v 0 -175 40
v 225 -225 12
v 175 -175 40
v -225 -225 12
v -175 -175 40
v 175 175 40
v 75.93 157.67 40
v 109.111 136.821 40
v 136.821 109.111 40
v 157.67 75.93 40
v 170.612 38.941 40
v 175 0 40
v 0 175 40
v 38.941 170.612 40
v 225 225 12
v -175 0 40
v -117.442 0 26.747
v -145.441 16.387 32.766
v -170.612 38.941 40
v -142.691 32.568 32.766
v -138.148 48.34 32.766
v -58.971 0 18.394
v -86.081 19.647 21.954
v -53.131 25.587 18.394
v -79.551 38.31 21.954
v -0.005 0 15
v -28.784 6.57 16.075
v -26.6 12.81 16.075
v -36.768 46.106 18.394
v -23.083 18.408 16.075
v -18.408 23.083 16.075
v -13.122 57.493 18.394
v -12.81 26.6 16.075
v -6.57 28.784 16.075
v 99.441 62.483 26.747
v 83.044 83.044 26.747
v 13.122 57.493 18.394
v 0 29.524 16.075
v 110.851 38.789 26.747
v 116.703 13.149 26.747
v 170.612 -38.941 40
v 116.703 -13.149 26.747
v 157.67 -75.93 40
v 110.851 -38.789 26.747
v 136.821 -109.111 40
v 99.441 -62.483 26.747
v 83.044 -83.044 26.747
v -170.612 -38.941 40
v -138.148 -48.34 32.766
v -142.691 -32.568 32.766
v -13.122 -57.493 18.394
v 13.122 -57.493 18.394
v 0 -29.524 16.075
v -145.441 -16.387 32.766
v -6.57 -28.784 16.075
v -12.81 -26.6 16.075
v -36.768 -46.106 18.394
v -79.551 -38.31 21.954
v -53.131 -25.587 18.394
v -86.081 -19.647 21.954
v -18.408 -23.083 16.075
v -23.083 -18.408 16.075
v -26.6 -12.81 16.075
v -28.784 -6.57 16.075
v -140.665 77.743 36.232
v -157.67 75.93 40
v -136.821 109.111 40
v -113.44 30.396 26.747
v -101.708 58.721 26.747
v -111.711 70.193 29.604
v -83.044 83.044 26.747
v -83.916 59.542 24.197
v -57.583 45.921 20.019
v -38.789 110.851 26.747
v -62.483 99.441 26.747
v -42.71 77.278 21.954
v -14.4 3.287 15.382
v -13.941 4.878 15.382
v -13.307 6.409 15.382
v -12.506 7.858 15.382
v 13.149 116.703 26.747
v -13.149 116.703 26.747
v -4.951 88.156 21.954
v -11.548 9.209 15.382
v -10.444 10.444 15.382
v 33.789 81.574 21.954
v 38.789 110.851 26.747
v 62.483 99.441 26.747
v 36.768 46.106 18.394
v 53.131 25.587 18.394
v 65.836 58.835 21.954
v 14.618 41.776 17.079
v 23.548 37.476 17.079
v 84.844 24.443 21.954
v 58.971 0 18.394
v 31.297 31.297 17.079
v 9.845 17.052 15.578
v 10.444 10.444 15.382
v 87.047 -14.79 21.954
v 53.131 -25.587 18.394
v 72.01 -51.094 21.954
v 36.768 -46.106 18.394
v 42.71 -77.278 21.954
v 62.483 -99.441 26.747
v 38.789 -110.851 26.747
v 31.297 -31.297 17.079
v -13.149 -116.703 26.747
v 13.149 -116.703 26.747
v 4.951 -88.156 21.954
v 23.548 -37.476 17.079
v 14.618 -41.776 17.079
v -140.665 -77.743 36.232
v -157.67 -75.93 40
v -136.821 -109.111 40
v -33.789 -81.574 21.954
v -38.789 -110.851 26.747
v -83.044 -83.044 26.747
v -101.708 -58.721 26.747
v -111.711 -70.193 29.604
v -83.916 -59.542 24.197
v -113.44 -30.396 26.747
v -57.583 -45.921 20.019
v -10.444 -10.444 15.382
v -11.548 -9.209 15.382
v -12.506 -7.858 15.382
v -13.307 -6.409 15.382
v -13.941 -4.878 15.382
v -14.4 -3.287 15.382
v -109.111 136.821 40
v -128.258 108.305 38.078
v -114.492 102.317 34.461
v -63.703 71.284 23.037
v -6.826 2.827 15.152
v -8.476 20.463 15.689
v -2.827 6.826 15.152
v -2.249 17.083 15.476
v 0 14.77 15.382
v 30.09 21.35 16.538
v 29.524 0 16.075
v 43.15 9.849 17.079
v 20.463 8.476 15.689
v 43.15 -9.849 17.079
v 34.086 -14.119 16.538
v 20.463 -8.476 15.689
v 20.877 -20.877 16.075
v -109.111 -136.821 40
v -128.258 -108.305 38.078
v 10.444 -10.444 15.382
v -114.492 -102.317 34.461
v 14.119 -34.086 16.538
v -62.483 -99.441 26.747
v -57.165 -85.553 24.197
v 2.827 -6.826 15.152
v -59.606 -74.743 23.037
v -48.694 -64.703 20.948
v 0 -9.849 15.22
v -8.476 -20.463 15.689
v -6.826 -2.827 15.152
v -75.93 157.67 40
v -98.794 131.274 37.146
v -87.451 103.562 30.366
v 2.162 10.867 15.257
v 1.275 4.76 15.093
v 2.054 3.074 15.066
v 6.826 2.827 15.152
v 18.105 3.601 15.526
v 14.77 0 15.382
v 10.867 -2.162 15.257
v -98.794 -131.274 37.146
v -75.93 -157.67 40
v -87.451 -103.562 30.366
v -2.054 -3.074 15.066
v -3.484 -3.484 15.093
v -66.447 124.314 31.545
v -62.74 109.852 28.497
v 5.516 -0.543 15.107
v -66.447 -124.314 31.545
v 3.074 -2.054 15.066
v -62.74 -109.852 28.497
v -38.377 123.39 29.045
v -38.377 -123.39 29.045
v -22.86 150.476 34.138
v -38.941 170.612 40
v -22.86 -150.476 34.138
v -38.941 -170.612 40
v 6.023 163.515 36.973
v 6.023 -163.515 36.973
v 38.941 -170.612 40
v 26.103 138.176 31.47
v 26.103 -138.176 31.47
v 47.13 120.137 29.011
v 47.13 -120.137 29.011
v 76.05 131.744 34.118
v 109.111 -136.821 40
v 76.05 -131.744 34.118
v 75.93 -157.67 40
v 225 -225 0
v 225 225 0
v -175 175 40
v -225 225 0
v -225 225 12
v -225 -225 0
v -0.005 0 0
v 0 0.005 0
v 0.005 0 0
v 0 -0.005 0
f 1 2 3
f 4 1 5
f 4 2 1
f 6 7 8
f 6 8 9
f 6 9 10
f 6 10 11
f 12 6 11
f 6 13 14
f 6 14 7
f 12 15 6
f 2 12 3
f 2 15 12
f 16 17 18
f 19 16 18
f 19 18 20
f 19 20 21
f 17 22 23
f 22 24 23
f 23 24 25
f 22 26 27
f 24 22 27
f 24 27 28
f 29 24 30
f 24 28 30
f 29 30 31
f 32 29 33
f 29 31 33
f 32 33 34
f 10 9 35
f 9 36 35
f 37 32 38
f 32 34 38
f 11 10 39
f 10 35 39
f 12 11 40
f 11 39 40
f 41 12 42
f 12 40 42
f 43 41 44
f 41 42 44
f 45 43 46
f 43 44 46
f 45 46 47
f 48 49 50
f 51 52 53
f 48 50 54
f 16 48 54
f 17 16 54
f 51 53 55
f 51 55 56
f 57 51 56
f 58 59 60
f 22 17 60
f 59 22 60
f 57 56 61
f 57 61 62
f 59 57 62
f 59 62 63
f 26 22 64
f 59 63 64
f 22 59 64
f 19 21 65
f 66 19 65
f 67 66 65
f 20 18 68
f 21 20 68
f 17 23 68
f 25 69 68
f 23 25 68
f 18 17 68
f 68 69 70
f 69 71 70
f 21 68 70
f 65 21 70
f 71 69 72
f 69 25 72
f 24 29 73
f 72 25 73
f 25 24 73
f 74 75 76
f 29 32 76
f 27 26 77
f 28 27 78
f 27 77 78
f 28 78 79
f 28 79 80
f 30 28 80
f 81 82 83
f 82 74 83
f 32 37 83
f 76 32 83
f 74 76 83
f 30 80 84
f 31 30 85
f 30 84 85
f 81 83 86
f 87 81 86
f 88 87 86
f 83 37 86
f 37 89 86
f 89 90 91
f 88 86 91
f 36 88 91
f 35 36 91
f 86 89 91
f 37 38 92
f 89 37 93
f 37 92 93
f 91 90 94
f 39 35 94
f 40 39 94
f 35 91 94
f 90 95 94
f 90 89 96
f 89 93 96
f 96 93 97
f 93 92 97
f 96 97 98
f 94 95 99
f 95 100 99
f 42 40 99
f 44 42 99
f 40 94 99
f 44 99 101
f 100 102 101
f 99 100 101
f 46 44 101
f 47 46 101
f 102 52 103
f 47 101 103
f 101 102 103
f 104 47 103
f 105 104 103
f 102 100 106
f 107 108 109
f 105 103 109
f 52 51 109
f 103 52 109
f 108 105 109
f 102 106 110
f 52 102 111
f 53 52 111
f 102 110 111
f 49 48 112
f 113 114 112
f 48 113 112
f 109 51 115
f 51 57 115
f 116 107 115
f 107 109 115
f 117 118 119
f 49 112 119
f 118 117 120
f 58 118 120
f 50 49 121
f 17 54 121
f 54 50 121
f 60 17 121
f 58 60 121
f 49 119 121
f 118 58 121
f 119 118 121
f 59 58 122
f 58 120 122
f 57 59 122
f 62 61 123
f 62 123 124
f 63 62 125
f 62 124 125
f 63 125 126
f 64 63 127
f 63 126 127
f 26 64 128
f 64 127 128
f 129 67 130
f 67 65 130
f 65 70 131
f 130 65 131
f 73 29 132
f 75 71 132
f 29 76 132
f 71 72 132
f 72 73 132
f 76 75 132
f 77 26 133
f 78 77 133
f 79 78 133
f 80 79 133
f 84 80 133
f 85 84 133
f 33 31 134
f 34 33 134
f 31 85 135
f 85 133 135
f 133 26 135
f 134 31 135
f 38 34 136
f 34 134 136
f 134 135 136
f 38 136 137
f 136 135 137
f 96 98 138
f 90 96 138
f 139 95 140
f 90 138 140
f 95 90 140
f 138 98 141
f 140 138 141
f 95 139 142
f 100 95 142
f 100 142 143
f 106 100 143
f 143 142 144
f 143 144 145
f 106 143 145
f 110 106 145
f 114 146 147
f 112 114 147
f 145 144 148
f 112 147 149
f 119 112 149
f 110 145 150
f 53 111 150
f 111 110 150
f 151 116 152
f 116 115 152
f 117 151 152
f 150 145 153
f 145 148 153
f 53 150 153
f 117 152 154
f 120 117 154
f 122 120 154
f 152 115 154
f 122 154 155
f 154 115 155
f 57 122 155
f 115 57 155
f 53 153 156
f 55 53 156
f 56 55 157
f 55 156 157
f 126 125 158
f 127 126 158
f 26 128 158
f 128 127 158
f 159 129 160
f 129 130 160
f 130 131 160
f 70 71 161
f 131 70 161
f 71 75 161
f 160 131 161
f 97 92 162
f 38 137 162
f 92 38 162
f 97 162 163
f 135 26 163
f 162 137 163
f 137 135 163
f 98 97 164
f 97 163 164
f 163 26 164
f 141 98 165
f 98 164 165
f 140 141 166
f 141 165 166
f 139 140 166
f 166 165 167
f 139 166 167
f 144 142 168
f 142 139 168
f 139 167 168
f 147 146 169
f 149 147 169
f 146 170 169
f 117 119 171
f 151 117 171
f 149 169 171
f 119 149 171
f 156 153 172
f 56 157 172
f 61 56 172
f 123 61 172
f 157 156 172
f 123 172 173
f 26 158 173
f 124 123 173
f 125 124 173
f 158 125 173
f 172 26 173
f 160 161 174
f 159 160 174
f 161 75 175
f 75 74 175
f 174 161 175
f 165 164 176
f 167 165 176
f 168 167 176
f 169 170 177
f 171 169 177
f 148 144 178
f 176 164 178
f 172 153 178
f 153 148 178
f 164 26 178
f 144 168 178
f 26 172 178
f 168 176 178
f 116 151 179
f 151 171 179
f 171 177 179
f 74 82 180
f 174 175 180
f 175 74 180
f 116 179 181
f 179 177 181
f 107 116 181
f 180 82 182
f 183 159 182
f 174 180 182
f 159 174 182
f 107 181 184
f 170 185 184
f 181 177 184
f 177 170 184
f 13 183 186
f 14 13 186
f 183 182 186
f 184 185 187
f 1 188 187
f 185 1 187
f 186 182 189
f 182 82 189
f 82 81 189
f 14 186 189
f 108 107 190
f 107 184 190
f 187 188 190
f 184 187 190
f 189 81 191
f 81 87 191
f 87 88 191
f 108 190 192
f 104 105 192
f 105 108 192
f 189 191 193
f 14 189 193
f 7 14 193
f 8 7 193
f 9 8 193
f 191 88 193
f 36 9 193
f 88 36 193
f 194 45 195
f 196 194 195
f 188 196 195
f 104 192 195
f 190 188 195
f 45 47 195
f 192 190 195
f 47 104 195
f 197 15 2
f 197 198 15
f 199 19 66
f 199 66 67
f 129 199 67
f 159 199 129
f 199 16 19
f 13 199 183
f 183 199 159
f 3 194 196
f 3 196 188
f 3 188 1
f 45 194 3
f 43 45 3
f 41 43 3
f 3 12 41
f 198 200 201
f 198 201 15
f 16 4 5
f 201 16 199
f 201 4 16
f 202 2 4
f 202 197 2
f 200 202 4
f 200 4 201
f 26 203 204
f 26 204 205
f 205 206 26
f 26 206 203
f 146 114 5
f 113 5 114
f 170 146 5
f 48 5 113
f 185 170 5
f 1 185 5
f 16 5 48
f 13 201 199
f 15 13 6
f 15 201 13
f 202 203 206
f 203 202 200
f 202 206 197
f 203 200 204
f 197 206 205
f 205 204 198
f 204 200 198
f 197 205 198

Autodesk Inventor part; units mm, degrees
ref_plane "YZ Plane" through (0, 0, 0) normal (1, 0, 0) x (0, 1, 0)
ref_plane "XZ Plane" through (0, 0, 0) normal (0, 1, 0) x (-1, 0, 0)
sketch "スケッチ1" plane through (0, 0, 0) normal (0, 0, 1) x (1, 0, 0)
  line L0 (-225, 225) -> (225, 225)
  line L1 (225, 225) -> (225, -225)
  line L2 (225, -225) -> (-225, -225)
  line L3 (-225, -225) -> (-225, 225)
  point P0 (0, 0)
  point P1 (0, 0)
  dimension "d0" = 450
extrude "押し出し1" add sketch "スケッチ1" along normal blind 12
sketch "スケッチ2" plane through (0, 0, 12) normal (0, 0, 1) x (1, 0, 0)
  line L0 (225, 225) -> (-225, 225) projected
  line L1 (-225, 225) -> (-225, -225) projected
  line L2 (-225, -225) -> (225, -225) projected
  line L3 (225, -225) -> (225, 225) projected
  point P0 (0, 0)
extrude "押し出し2" add sketch "スケッチ2" along normal blind 28
chamfer "面取り1" distance 50 distance2 28 1 edges at (0, 225, 40) measured on face at (-75, -75, 40)
chamfer "面取り2" distance 50 distance2 28 1 edges at (0, -225, 40) measured on face at (-75, 41.6667, 40)
chamfer "面取り3" distance 50 distance2 28 1 edges at (-225, 0, 40) measured on face at (-75, 58.3333, 40)
chamfer "面取り4" distance 50 distance2 28 1 edges at (225, 0, 40) measured on face at (-41.6667, -58.3333, 40)
ref_plane "作業平面2" through (-225, 0, 0) normal (0, -1, 0) x (1, 0, 0)
ref_plane "作業平面1" through (-225, 225, 0) normal (0, -1, 0) x (1, 0, 0)
sketch "スケッチ6" plane through (-225, 0, 0) normal (0, -1, 0) x (1, 0, 0)
  line L0 (225, 0) -> (225, 15)
  line L1 (50, 40) -> (0, 12) projected
  arc A0 (50, 40) -> (225, 15) centre (235.7026, 714.9182) ccw
  line L2 (50, 40) -> (225, 40.2475)
  line L3 (225, 40.2475) -> (225, 15)
  dimension "d18" = 15
  dimension "d19" = 700
  dimension "d20" = 175.0002
revolve "回転1" cut sketch "スケッチ6" angle 360 about axis through (0, 0, 40.2475) along (0, 0, -1)
sketch "スケッチ7" plane through (0, 0, 0) normal (0, 0, -1) x (-1, 0, 0)
  circle A0 centre (0, 0) radius 0.005
  dimension "d22" = 0.01
extrude "押し出し3" cut sketch "スケッチ7" against normal through all
properties part number "障害物、窪地"
